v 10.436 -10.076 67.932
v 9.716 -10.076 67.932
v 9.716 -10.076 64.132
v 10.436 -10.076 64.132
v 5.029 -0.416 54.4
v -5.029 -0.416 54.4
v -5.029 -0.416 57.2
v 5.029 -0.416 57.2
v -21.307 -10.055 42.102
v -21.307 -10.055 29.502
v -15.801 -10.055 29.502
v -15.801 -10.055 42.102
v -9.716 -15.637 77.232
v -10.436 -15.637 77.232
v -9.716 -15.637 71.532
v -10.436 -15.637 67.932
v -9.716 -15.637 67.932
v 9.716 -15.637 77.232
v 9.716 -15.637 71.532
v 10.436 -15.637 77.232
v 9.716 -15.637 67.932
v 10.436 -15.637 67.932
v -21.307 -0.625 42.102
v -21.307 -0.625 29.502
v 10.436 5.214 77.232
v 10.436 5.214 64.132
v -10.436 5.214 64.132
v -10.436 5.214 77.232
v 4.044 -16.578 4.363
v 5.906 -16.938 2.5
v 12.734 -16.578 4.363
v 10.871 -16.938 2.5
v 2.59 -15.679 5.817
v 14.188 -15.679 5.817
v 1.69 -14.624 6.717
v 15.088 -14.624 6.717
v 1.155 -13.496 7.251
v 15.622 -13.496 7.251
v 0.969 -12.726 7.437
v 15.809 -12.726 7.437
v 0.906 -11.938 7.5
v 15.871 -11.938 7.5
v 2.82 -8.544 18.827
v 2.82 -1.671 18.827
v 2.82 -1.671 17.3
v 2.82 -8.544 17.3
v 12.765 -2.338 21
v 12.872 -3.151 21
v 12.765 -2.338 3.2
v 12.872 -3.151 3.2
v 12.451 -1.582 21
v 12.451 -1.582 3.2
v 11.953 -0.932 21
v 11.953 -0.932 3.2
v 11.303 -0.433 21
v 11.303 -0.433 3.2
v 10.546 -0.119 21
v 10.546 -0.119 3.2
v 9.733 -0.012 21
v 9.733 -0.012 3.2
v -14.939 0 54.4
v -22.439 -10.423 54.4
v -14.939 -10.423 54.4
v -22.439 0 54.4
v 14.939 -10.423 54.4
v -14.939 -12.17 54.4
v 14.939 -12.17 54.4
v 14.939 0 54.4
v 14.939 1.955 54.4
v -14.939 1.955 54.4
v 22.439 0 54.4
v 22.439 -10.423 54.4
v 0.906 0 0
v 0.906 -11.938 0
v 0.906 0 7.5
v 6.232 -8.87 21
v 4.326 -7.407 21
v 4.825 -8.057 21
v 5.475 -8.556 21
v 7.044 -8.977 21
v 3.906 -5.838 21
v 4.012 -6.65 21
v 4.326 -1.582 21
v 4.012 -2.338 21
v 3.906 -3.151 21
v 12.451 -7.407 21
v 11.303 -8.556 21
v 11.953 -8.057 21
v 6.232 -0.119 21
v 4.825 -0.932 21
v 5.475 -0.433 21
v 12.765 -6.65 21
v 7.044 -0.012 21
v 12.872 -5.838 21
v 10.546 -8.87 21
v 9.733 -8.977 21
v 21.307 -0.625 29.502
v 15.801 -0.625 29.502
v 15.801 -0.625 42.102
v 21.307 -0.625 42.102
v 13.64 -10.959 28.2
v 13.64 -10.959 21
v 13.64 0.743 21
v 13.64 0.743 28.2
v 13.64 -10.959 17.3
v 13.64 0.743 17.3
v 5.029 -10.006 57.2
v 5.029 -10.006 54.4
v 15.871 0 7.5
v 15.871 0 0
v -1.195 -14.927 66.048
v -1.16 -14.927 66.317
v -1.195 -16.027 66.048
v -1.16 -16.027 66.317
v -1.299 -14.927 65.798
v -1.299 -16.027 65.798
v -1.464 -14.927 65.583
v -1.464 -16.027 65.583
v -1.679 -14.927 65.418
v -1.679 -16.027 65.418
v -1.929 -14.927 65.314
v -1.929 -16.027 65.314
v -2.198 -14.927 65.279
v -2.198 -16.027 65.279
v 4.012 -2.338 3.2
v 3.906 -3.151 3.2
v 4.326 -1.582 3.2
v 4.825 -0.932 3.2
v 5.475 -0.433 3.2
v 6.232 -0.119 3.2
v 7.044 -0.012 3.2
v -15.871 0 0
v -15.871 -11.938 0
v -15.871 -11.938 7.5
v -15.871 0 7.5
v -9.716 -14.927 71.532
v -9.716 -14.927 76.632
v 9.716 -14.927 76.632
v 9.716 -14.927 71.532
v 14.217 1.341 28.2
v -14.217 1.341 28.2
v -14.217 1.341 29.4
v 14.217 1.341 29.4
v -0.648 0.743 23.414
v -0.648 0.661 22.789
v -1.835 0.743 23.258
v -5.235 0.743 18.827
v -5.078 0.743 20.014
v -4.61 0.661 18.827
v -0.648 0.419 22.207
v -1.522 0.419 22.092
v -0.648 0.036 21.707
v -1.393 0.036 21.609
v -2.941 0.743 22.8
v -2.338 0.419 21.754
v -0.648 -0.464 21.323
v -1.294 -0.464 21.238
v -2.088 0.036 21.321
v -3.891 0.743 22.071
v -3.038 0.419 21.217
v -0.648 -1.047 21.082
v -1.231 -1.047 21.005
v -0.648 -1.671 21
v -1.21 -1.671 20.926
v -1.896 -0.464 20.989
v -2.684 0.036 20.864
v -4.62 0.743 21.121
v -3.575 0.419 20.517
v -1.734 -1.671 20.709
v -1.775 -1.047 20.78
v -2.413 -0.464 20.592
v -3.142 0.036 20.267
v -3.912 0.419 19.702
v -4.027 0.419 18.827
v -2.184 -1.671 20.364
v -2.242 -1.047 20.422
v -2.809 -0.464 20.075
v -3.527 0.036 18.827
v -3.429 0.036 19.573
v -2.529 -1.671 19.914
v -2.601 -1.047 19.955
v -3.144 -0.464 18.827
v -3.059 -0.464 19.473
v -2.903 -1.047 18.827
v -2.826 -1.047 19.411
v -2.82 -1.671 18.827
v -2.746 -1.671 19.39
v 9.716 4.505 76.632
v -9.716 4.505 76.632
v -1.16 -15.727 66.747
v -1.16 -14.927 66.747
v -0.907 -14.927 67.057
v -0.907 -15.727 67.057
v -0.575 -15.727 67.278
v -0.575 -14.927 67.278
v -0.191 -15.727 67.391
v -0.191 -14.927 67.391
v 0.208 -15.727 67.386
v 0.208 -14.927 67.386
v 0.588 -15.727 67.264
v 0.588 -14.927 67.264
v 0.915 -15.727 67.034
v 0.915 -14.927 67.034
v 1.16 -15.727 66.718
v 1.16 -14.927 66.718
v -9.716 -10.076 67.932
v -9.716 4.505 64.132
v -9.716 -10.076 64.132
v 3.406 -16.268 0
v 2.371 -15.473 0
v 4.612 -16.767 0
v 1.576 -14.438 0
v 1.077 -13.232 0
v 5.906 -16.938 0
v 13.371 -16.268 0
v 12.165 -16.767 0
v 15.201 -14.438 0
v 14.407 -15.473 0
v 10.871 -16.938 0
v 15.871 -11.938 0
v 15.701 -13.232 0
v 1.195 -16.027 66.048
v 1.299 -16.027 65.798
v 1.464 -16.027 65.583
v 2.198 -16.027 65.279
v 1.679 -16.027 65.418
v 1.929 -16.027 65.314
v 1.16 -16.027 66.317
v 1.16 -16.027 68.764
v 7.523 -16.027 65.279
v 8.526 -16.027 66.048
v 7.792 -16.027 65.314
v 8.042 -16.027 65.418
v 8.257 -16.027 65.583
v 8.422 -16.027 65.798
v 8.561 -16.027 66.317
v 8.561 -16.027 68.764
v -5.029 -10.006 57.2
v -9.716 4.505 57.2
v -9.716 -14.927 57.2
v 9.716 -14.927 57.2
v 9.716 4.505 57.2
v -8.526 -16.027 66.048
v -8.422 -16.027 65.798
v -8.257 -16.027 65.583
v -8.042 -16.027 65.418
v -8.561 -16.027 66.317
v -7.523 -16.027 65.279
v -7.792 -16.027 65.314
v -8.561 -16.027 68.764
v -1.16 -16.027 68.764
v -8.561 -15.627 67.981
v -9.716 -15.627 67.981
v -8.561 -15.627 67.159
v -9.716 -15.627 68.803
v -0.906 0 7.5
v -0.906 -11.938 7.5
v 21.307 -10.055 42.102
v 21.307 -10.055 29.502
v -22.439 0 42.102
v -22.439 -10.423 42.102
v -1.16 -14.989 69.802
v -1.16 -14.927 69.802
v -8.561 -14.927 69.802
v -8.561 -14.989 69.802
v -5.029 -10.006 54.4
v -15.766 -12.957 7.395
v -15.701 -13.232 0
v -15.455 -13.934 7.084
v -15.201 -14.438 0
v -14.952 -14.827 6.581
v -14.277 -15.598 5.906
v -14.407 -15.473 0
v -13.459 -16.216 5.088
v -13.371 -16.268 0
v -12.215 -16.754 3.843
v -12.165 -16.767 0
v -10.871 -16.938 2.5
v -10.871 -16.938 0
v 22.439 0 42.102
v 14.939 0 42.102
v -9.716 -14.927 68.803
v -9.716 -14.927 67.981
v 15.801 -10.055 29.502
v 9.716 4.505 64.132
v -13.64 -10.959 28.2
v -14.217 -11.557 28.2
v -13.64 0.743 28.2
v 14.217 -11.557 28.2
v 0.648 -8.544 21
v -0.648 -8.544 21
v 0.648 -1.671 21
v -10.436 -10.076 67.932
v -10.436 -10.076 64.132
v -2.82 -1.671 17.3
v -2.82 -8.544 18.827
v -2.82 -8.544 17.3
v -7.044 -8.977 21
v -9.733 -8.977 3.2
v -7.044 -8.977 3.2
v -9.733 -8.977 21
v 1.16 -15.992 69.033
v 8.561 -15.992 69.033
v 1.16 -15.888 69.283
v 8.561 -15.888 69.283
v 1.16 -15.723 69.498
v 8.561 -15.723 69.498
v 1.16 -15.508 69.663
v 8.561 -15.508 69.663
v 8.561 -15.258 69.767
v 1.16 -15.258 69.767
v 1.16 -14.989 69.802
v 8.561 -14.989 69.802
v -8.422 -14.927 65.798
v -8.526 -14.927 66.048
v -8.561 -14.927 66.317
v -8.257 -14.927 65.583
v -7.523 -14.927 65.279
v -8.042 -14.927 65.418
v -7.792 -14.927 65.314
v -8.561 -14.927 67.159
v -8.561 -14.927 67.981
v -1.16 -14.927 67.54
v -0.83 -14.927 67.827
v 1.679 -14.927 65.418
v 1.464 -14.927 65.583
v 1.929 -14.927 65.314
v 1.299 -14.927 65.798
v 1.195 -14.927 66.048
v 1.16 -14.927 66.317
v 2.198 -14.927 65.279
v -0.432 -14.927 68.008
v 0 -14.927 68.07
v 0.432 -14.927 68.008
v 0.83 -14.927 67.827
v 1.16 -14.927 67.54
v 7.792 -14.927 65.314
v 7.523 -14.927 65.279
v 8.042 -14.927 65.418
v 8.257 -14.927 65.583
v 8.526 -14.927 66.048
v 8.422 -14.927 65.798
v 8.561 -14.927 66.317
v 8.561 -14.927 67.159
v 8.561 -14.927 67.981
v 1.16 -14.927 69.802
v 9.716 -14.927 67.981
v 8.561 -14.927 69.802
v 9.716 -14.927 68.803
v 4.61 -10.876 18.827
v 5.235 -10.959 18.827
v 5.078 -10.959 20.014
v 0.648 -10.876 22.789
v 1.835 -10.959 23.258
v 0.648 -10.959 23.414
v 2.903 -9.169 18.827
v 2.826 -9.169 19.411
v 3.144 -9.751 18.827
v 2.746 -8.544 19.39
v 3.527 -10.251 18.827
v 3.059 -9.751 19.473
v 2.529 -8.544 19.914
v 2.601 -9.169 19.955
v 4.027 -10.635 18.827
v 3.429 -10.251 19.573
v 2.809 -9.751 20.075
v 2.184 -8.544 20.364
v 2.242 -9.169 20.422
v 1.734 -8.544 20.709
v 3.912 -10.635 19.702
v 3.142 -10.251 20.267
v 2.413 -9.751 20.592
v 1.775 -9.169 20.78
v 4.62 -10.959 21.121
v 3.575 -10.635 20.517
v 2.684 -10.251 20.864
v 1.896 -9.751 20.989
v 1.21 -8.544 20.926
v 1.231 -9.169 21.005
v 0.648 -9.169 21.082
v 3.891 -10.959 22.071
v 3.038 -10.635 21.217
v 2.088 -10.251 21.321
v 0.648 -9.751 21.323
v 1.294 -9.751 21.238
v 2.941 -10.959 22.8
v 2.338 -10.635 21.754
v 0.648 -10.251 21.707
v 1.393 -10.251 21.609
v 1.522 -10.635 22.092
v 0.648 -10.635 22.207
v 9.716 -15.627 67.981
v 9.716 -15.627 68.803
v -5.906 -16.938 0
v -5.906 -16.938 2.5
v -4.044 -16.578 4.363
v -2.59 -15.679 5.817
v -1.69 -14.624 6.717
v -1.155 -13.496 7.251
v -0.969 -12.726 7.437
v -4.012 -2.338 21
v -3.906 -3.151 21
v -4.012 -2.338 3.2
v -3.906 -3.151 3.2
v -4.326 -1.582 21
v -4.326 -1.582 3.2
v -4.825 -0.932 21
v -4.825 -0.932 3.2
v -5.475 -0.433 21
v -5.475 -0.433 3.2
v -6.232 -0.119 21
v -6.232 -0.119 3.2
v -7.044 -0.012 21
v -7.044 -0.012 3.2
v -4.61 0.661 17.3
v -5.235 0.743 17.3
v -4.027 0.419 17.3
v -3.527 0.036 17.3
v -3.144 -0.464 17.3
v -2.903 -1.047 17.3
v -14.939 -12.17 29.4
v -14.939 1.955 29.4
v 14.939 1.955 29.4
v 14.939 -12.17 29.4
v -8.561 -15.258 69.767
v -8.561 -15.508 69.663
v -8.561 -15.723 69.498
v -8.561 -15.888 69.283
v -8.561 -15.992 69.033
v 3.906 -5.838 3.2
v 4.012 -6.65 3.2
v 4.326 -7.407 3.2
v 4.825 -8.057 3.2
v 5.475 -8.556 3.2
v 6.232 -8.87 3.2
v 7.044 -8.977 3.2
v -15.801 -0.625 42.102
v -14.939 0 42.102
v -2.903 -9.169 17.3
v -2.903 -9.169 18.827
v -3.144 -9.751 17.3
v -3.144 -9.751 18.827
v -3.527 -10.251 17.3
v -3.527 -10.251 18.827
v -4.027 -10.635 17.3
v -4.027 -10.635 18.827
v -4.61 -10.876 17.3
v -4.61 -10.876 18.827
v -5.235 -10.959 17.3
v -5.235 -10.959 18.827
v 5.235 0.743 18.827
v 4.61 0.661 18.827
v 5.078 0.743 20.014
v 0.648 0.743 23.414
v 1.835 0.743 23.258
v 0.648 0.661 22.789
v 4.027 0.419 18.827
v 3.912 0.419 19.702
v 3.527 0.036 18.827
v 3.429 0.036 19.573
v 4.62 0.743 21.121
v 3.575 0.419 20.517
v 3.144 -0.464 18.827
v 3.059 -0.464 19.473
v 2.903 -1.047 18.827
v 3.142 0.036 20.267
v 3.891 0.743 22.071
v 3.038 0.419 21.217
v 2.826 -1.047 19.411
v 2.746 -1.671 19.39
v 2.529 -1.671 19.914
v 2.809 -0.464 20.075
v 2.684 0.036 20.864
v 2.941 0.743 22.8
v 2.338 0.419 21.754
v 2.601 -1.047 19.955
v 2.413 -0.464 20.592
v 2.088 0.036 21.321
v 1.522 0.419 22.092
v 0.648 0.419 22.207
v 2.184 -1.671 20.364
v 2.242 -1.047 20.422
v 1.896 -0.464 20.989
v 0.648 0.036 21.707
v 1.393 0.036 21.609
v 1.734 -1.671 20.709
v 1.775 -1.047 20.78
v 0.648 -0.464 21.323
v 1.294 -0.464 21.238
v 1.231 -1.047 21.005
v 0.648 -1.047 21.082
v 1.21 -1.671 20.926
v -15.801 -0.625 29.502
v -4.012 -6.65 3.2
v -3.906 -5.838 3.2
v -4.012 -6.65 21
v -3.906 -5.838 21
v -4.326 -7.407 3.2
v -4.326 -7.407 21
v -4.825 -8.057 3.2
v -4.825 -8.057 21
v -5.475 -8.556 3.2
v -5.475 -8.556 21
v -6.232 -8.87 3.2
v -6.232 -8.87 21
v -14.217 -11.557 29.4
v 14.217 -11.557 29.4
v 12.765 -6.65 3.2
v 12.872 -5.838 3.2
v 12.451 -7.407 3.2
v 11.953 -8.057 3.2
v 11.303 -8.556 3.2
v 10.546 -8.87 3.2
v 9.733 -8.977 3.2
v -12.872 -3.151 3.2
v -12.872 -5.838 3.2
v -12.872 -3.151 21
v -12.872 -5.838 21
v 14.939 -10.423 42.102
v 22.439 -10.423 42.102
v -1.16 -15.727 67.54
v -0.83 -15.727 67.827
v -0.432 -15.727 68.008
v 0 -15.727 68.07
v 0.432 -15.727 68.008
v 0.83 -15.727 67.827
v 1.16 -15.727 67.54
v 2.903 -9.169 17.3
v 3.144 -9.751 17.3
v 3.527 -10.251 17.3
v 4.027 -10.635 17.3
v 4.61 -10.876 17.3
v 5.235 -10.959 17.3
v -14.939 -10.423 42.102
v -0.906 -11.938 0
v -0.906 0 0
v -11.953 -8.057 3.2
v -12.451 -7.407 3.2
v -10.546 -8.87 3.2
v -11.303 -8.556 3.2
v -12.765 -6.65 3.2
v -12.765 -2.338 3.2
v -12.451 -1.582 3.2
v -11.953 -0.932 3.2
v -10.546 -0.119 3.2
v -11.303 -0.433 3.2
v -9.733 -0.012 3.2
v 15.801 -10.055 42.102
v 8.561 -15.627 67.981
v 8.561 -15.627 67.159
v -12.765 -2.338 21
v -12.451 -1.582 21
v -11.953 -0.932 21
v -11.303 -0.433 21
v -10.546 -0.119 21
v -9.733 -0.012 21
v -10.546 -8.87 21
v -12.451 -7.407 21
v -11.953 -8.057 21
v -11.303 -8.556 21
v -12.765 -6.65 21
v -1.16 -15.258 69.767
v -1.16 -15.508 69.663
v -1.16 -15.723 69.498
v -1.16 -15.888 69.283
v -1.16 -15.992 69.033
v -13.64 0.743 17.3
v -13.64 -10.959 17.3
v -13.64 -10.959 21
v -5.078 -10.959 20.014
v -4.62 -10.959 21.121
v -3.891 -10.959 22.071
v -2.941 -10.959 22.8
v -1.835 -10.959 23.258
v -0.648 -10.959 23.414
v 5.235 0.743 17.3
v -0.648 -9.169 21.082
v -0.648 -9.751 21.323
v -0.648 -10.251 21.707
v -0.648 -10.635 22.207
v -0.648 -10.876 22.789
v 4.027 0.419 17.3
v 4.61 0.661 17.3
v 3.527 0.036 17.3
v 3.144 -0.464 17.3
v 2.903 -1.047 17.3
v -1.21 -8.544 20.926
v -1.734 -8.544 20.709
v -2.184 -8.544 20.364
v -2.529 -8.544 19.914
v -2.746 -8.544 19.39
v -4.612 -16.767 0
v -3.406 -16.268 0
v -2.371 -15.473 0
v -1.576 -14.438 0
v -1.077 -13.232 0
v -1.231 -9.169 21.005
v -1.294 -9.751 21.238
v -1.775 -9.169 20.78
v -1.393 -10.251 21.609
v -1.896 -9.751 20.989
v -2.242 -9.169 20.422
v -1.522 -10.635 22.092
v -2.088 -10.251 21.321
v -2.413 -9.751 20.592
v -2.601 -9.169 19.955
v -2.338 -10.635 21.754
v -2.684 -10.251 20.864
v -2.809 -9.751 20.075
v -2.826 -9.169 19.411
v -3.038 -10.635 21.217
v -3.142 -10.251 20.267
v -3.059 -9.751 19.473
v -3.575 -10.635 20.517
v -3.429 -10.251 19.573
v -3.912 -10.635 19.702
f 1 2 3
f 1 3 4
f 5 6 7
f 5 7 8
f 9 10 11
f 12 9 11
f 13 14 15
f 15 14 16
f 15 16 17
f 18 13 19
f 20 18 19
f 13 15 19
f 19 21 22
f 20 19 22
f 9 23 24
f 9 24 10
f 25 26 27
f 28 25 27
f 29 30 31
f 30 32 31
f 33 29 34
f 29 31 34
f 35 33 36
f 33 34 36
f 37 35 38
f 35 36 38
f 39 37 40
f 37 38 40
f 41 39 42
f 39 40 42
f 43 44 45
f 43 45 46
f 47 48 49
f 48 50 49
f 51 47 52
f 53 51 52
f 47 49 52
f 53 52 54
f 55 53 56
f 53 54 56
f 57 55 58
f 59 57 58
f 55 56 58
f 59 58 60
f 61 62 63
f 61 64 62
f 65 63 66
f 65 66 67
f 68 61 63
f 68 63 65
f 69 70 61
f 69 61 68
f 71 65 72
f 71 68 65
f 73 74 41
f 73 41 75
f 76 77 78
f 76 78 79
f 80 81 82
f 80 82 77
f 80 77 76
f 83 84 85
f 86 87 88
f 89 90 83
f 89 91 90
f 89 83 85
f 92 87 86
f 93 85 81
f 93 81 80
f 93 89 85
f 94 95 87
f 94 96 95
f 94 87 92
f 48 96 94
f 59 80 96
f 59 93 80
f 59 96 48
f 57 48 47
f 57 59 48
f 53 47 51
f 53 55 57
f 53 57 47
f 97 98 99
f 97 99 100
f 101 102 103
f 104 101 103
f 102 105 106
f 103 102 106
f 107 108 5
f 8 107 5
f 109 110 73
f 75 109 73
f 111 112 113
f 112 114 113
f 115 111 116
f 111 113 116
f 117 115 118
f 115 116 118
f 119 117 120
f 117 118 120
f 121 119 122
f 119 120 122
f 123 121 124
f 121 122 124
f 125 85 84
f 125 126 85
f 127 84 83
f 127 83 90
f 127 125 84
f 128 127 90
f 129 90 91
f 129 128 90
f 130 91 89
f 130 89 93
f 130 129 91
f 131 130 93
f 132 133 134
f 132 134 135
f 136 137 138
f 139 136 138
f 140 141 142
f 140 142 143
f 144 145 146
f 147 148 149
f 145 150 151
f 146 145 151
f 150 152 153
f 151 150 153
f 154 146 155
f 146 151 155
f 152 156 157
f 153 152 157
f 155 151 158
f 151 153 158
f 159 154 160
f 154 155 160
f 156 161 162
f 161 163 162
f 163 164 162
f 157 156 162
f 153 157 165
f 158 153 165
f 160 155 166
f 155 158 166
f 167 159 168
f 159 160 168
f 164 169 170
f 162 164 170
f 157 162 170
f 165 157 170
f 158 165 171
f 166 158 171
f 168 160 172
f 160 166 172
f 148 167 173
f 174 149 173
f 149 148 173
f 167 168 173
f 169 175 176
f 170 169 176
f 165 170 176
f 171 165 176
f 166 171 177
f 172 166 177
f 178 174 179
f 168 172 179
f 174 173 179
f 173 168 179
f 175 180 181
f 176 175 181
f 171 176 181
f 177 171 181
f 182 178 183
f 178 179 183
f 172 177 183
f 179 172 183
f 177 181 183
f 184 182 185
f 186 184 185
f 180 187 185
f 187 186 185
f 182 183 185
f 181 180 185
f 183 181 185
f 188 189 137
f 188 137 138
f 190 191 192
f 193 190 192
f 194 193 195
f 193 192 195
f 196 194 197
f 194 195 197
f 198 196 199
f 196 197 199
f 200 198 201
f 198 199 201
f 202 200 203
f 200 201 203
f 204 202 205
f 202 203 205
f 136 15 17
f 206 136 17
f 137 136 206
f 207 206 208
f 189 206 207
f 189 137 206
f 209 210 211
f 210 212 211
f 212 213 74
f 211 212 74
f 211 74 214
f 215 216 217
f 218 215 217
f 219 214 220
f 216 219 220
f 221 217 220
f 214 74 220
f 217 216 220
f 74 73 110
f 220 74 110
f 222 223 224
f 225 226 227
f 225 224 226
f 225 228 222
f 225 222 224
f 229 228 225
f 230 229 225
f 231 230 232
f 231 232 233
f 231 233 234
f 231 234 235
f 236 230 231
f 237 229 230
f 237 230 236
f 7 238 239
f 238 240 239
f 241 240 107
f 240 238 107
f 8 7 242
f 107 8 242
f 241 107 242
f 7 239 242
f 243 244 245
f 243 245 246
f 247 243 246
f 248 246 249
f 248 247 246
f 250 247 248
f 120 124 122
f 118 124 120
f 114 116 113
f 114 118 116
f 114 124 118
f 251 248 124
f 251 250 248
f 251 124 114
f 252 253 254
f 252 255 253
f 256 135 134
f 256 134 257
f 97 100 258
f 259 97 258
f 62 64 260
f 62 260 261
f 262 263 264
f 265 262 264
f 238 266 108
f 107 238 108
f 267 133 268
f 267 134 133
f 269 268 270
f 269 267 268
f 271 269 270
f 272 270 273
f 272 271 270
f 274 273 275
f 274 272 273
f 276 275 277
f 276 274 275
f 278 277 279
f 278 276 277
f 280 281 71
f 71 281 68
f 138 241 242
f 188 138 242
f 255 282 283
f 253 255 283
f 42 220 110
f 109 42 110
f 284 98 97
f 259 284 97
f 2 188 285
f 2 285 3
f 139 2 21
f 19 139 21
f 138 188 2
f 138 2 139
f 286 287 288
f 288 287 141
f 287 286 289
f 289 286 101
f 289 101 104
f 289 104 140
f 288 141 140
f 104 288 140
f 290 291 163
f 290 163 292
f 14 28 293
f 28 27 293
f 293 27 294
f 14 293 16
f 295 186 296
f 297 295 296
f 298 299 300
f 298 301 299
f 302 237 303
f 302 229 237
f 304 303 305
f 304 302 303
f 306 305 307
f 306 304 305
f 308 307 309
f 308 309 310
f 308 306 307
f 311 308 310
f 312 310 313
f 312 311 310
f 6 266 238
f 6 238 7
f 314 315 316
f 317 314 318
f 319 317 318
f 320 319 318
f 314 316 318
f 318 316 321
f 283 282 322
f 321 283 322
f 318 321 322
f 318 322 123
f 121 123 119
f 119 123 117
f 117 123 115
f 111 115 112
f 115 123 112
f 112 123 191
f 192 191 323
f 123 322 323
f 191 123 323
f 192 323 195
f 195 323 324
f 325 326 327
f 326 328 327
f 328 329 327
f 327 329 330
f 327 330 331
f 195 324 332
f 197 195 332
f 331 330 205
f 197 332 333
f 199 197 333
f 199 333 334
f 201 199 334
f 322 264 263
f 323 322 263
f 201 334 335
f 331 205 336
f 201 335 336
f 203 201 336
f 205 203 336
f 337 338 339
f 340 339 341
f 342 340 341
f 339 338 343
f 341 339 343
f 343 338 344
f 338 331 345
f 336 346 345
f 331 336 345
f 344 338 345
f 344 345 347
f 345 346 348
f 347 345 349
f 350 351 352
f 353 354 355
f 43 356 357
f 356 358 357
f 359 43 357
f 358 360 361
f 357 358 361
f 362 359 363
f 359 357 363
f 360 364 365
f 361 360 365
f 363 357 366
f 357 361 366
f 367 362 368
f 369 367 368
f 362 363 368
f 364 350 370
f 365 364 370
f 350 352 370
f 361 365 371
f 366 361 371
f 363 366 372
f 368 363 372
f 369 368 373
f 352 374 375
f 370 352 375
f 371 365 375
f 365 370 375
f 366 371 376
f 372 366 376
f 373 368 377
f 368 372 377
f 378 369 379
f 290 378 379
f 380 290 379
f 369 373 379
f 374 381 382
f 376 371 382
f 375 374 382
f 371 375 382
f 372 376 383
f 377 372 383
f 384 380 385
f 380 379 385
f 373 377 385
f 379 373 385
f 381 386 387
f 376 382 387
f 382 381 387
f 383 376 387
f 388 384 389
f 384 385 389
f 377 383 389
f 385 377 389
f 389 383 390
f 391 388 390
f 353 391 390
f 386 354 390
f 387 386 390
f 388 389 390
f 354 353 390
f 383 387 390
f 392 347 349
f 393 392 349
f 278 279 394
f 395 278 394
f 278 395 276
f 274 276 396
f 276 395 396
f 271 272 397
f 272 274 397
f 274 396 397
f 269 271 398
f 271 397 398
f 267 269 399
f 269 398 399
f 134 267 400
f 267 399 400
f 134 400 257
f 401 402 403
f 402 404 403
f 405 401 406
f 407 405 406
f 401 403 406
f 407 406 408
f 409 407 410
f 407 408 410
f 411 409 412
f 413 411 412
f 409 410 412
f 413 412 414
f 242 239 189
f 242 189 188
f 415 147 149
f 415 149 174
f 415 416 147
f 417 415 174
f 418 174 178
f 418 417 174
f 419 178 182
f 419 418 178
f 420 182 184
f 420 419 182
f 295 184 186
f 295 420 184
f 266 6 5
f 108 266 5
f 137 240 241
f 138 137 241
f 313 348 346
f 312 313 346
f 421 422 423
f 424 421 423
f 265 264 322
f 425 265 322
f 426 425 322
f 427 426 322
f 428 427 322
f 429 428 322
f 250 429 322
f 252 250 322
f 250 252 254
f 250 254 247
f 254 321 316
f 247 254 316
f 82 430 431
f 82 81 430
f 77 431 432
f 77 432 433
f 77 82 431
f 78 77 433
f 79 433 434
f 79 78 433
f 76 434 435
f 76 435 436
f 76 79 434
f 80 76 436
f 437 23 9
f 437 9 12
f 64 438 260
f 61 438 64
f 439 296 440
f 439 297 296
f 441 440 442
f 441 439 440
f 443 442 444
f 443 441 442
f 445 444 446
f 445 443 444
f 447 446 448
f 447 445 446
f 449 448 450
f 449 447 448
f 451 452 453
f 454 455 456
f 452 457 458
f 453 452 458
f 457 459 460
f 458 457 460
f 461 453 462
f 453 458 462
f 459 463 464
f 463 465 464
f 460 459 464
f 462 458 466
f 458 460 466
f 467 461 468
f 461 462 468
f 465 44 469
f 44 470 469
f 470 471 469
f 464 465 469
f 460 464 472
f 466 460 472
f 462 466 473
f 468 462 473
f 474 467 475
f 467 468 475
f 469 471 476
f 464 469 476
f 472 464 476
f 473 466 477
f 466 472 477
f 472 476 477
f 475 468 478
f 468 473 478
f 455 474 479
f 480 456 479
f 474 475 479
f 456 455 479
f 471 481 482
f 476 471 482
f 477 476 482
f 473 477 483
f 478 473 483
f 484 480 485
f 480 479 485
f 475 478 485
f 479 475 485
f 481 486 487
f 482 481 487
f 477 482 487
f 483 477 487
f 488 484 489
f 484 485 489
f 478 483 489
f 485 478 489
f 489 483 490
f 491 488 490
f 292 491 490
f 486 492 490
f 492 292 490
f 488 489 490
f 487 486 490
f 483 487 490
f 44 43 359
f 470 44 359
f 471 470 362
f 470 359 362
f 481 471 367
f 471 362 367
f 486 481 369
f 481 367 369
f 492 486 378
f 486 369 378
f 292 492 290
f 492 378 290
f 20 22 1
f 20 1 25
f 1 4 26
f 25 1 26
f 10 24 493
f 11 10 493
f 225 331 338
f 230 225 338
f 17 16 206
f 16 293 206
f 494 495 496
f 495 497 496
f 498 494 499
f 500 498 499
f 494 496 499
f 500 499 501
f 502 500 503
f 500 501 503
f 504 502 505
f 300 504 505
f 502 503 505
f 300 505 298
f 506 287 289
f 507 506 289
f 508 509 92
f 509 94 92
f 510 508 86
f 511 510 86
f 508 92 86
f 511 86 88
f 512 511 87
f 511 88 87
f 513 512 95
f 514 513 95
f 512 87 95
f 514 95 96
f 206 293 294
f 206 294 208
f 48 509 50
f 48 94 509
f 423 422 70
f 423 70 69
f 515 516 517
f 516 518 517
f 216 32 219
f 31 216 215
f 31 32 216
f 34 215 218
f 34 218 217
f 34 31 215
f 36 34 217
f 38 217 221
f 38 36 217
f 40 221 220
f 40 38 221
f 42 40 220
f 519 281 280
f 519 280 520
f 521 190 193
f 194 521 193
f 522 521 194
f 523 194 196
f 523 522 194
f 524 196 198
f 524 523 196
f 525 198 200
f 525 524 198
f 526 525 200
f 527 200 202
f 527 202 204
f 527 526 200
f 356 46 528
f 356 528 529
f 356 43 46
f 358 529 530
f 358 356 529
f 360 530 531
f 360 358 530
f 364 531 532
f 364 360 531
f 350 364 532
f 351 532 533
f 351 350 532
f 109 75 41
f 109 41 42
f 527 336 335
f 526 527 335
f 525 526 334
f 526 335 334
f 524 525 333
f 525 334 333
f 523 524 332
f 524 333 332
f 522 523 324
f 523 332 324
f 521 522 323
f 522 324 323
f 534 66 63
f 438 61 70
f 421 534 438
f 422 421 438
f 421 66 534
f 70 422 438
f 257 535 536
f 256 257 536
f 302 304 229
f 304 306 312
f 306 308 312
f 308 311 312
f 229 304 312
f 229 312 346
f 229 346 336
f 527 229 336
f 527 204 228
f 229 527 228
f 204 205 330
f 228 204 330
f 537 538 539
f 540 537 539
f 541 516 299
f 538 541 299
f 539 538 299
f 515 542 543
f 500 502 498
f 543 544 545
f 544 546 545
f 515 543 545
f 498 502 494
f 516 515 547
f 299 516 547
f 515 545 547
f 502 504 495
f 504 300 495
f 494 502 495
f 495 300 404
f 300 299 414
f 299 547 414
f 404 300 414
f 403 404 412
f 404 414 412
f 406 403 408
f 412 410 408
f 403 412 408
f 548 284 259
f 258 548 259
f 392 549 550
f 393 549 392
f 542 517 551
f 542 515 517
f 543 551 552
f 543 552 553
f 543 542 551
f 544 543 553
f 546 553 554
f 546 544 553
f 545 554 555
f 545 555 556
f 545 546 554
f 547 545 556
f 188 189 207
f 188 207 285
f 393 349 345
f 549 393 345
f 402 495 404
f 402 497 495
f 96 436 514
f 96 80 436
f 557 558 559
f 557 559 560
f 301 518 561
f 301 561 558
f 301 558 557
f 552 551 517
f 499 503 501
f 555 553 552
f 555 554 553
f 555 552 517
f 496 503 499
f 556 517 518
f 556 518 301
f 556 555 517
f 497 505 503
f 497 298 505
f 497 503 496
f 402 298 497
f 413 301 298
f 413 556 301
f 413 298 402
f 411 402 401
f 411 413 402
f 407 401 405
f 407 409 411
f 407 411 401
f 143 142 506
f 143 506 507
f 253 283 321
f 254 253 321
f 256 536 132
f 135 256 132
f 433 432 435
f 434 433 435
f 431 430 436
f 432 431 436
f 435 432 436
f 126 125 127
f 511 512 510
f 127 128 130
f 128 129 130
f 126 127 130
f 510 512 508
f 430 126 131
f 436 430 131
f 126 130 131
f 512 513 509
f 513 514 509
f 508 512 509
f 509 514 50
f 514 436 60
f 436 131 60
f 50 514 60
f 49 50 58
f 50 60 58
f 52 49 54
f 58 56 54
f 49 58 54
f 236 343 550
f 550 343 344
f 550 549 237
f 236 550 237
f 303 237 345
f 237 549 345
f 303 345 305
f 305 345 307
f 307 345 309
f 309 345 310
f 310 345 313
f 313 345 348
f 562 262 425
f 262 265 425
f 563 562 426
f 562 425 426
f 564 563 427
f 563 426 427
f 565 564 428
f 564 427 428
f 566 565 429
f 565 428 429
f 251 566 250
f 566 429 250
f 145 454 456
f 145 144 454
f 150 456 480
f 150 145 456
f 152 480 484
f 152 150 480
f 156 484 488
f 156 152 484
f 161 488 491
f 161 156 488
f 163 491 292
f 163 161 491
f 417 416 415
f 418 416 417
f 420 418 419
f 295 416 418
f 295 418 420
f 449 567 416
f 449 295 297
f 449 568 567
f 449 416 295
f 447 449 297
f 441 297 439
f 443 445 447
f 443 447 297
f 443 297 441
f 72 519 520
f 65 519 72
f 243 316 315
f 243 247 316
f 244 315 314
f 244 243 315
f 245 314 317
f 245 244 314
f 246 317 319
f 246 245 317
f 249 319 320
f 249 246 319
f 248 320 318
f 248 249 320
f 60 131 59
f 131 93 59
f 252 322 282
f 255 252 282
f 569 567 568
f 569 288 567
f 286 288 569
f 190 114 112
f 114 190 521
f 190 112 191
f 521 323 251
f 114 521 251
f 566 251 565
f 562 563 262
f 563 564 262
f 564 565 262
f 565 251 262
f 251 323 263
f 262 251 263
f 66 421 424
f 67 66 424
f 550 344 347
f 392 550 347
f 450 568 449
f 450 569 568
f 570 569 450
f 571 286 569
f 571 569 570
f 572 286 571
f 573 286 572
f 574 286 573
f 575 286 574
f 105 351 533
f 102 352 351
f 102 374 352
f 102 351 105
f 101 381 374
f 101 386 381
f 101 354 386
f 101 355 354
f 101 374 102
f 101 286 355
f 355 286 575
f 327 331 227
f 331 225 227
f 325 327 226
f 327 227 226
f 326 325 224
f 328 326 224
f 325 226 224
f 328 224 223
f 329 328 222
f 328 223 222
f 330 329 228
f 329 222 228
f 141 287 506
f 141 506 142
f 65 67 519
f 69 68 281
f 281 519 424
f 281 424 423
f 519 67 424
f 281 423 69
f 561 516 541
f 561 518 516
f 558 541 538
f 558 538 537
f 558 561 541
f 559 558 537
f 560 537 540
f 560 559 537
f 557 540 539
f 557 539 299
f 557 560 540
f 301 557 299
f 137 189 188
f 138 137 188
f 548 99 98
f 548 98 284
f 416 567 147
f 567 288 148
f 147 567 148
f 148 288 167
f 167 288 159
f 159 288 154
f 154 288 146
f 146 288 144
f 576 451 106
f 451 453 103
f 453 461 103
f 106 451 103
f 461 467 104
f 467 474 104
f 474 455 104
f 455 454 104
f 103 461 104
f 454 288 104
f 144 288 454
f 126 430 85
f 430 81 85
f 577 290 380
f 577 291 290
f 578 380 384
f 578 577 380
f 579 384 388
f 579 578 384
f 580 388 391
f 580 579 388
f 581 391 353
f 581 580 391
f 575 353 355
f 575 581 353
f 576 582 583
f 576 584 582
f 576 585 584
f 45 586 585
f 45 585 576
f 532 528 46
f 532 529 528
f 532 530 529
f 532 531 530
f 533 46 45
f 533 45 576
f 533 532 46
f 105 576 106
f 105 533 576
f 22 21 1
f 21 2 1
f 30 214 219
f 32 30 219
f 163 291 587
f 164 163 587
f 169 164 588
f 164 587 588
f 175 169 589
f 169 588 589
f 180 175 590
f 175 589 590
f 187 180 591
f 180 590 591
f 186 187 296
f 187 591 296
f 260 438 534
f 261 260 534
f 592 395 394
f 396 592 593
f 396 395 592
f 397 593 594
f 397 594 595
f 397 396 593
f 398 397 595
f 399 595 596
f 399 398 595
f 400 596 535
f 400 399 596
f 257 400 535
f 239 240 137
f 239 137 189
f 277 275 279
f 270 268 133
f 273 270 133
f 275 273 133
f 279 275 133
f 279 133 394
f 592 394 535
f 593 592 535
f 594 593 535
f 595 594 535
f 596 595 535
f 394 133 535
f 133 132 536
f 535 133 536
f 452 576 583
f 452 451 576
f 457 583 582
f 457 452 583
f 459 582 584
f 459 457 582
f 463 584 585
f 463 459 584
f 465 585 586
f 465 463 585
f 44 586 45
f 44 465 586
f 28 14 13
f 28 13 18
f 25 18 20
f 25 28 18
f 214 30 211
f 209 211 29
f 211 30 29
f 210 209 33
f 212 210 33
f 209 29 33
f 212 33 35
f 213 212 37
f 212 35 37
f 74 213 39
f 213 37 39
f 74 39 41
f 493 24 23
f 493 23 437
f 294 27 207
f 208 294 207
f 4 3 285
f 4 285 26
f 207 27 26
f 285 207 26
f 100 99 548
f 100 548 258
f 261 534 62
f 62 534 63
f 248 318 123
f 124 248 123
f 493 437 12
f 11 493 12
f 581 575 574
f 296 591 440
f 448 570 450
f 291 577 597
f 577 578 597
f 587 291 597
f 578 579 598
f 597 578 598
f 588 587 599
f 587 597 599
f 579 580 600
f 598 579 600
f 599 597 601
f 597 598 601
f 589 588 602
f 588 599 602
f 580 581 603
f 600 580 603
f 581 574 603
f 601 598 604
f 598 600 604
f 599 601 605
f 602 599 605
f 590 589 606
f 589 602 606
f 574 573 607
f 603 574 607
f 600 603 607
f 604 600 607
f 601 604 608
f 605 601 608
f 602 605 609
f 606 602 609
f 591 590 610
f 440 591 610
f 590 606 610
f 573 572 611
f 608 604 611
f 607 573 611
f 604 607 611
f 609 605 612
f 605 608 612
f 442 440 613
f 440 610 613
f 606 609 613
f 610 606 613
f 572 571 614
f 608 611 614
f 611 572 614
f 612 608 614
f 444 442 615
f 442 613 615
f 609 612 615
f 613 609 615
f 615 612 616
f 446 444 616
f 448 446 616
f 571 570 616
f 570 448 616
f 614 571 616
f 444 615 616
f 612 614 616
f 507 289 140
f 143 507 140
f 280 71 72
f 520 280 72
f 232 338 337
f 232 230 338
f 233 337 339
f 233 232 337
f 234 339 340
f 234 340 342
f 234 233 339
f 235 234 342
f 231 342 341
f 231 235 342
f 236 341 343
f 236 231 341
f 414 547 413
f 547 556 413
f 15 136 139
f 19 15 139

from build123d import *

# Parameters (mm, degrees)
F0_W           = 14.9648044608
F0_H           = 16.937578097
F0_W_2         = 1.812669565
F0_W_3         = 14.9648083382
F1_DEPTH       = 7.5
F2_DEPTH       = 14.2
F3_R           = 5
F4_W           = 8.966412507
F4_H           = 8.9642944624
F5_DEPTH       = 13.5
F5_DEPTH_BACK  = 4.3
F6_R           = 3.1384776311
F6_2_R         = 3.1384776311
F7_W           = 27.2792670876
F7_H           = 11.7013510317
F8_DEPTH       = 7.2
F9_W           = 10.8192516491
F9_H           = 11.7013510317
F10_DEPTH      = 3.7
F10_DEPTH_BACK = 2.3
F11_R          = 2.1727922061
F12_R          = 2.4142135624
F13_W          = 28.4332055598
F13_H          = 12.8980111331
F14_DEPTH      = 1.2
F15_W          = 29.8774708062
F15_H          = 14.1250584275
F15_W_2        = 28.4332055598
F15_H_2        = 12.8980111331
F16_DEPTH      = 25
F17_W          = 10.4226022959
F17_H          = 12.2977413476
F18_DEPTH      = 7.5
F18_DEPTH_BACK = 37.37747
F19_W          = 5.5065192282
F19_H          = 9.4299116172
F20_DEPTH      = 12.6
F21_W          = 10.0570814684
F21_H          = 9.5903184265
F22_DEPTH      = 2.8
F23_W          = 19.431643188
F23_H          = 19.43164
F23_W_2        = 10.0570814684
F23_H_2        = 9.5903184265
F24_DEPTH      = 19.43164
F26_DEPTH      = 12.5
F27_DEPTH      = 8.7
F25_W          = 19.431643188
F25_H          = 0.7098612483
F28_DEPTH      = 5.1
F29_DEPTH      = 0.6
F31_DEPTH      = 0.8
F32_DEPTH      = 1.1
F33_DEPTH      = 0.7
F34_R          = 1.0381118318


with BuildPart() as f1:
    # F0 (on Top) → F1 (new body)
    with BuildSketch(Plane.XY):
        with Locations((-8.3887370129, -8.4687890485)):
            Rectangle(F0_W, F0_H)
        with Locations((0, -8.4687890485)):
            Rectangle(F0_W_2, F0_H)
        with Locations((8.3887389516, -8.4687890485)):
            Rectangle(F0_W_3, F0_H)
    extrude(amount=F1_DEPTH)

    # F0 (on Top) → F2 (cut)
    with BuildSketch(Plane.XY):
        with Locations((0, -8.4687890485)):
            Rectangle(F0_W_2, F0_H)
    extrude(amount=F2_DEPTH, mode=Mode.SUBTRACT)

    # F3
    f3_edges = [f1.edges().sort_by_distance(p)[0] for p in [
        (-15.871139, -16.937578, 3.75),
        (-0.906335, -16.937578, 3.75),
        (0.906335, -16.937578, 3.75),
        (15.871143, -16.937578, 3.75),
        (-8.388737, -16.937578, 7.5),
        (8.388739, -16.937578, 7.5),
    ]]
    fillet(f3_edges, radius=F3_R)


with BuildPart() as f5:
    # F4 (on face) → F5 (new body, two sides)
    with BuildSketch(Plane.XY.offset(7.5)) as f5_sk:
        with Locations((-8.3887370129, -4.4944216307)):
            Rectangle(F4_W, F4_H)
    extrude(amount=F5_DEPTH)
    extrude(f5_sk.sketch, amount=-F5_DEPTH_BACK)

    # F6
    f6_edges = [f5.edges().sort_by_distance(p)[0] for p in [
        (-12.871943, -8.976569, 12.1),
        (-3.905531, -8.976569, 12.1),
        (-12.871943, -0.012274, 12.1),
        (-3.905531, -0.012274, 12.1),
    ]]
    fillet(f6_edges, radius=F6_R)


with BuildPart() as f5b:
    # F4 (on face) → F5, piece 2 (new body, two sides)
    with BuildSketch(Plane.XY.offset(7.5)) as f5_2_sk:
        with Locations((8.3887370129, -4.4944216307)):
            Rectangle(F4_W, F4_H)
    extrude(amount=F5_DEPTH)
    extrude(f5_2_sk.sketch, amount=-F5_DEPTH_BACK)

    # F6#2
    f6_2_edges = [f5b.edges().sort_by_distance(p)[0] for p in [
        (3.905531, -8.976569, 12.1),
        (12.871943, -8.976569, 12.1),
        (12.871943, -0.012274, 12.1),
        (3.905531, -0.012274, 12.1),
    ]]
    fillet(f6_2_edges, radius=F6_2_R)


with BuildPart() as f8:
    # F7 (on face) → F8 (new body)
    with BuildSketch(Plane.XY.offset(21)):
        with Locations((0, -5.1078274846)):
            Rectangle(F7_W, F7_H)
    extrude(amount=F8_DEPTH)

    # F9 (on face) → F10 (join, two sides)
    with BuildSketch(Plane(origin=(0, 0, 21), x_dir=(1, 0, 0), z_dir=(0, 0, -1))) as f10_sk:
        with Locations((-8.2300077192, 5.1078274846)):
            Rectangle(F9_W, F9_H)
        with Locations((8.2300077192, 5.1078274846)):
            Rectangle(F9_W, F9_H)
    extrude(amount=F10_DEPTH)
    extrude(f10_sk.sketch, amount=-F10_DEPTH_BACK)

    # F11
    f11_edges = [f8.edges().sort_by_distance(p)[0] for p in [
        (2.820382, -5.107827, 21),
        (-2.820382, -5.107827, 21),
    ]]
    fillet(f11_edges, radius=F11_R)

    # F12
    f12_edges = [f8.edges().sort_by_distance(p)[0] for p in [
        (2.183986, 0.742848, 20.363604),
        (-2.183986, -10.958503, 20.363604),
        (2.820382, -10.958503, 18.063604),
        (2.183986, -10.958503, 20.363604),
        (0, -10.958503, 21),
        (-2.820382, -10.958503, 18.063604),
        (2.820382, 0.742848, 18.063604),
        (0, 0.742848, 21),
        (-2.183986, 0.742848, 20.363604),
        (-2.820382, 0.742848, 18.063604),
    ]]
    fillet(f12_edges, radius=F12_R)

    # F13 (on face) → F14 (join)
    with BuildSketch(Plane.XY.offset(28.2)):
        with Locations((0, -5.1078274846)):
            Rectangle(F13_W, F13_H)
    extrude(amount=F14_DEPTH)


with BuildPart() as f16:
    # F15 (on face) → F16 (new body)
    with BuildSketch(Plane.XY.offset(29.4)):
        with Locations((0, -5.1078274846)):
            Rectangle(F15_W, F15_H)
        with Locations((0, -5.1078274846)):
            Rectangle(F15_W_2, F15_H_2, mode=Mode.SUBTRACT)
        with Locations((0, -5.1078274846)):
            Rectangle(F15_W_2, F15_H_2)
    extrude(amount=F16_DEPTH)

    # F17 (on face) → F18 (join, two sides)
    with BuildSketch(Plane(origin=(-14.9387354031, 0, 0), x_dir=(0, -1, 0), z_dir=(-1, 0, 0))) as f18_sk:
        with Locations((5.2113011479, 48.2511293262)):
            Rectangle(F17_W, F17_H)
    extrude(amount=F18_DEPTH)
    extrude(f18_sk.sketch, amount=-F18_DEPTH_BACK)


with BuildPart() as f20:
    # F19 (on face) → F20 (new body)
    with BuildSketch(Plane(origin=(0, 0, 42.1022586524), x_dir=(1, 0, 0), z_dir=(0, 0, -1))):
        with Locations((-18.5539349914, 5.3402557969)):
            Rectangle(F19_W, F19_H)
    extrude(amount=F20_DEPTH)


with BuildPart() as f20b:
    # F19 (on face) → F20, piece 2 (new body)
    with BuildSketch(Plane(origin=(0, 0, 42.1022586524), x_dir=(1, 0, 0), z_dir=(0, 0, -1))):
        with Locations((18.5539349914, 5.3402557969)):
            Rectangle(F19_W, F19_H)
    extrude(amount=F20_DEPTH)


with BuildPart() as f22:
    # F21 (on face) → F22 (new body)
    with BuildSketch(Plane.XY.offset(54.4)):
        with Locations((0, -5.2113011479)):
            Rectangle(F21_W, F21_H)
    extrude(amount=F22_DEPTH)

    # F23 (on face) → F24 (join)
    with BuildSketch(Plane.XY.offset(57.2)):
        with Locations((0, -5.2113011479)):
            Rectangle(F23_W, F23_H)
        with Locations((0, -5.2113011479)):
            Rectangle(F23_W_2, F23_H_2, mode=Mode.SUBTRACT)
        with Locations((0, -5.2113011479)):
            Rectangle(F23_W_2, F23_H_2)
    extrude(amount=F24_DEPTH)


with BuildPart() as f26:
    # F25 (on face) → F26 (new body)
    with BuildSketch(Plane.XY.offset(76.63164)):
        Polygon((9.715821594, -10.076250881), (10.4362731799, -10.076250881), (10.4362731799, 5.2143801004), (-10.4362731799, 5.2143801004), (-10.4362731799, -10.076250881), (-9.715821594, -10.076250881), (-9.715821594, 4.5045188521), (9.715821594, 4.5045188521), align=None)
    extrude(amount=-F26_DEPTH)

    # F25 (on face) → F27 (join)
    with BuildSketch(Plane.XY.offset(76.63164)):
        Polygon((-10.4362731799, -15.6369823962), (-9.715821594, -15.6369823962), (-9.715821594, -14.9271211479), (-9.715821594, -10.076250881), (-10.4362731799, -10.076250881), align=None)
        Polygon((9.715821594, -15.6369823962), (10.4362731799, -15.6369823962), (10.4362731799, -10.076250881), (9.715821594, -10.076250881), (9.715821594, -14.9271211479), align=None)
    extrude(amount=-F27_DEPTH)

    # F25 (on face) → F28 (join)
    with BuildSketch(Plane.XY.offset(76.63164)):
        with Locations((0, -15.2820517721)):
            Rectangle(F25_W, F25_H)
    extrude(amount=-F28_DEPTH)

    # F25 (on face) → F29 (join)
    with BuildSketch(Plane.XY.offset(76.63164)):
        Polygon((9.715821594, -10.076250881), (10.4362731799, -10.076250881), (10.4362731799, 5.2143801004), (-10.4362731799, 5.2143801004), (-10.4362731799, -10.076250881), (-9.715821594, -10.076250881), (-9.715821594, 4.5045188521), (9.715821594, 4.5045188521), align=None)
        Polygon((-10.4362731799, -15.6369823962), (-9.715821594, -15.6369823962), (-9.715821594, -14.9271211479), (-9.715821594, -10.076250881), (-10.4362731799, -10.076250881), align=None)
        with Locations((0, -15.2820517721)):
            Rectangle(F25_W, F25_H)
        Polygon((-9.715821594, -14.9271211479), (9.715821594, -14.9271211479), (9.715821594, -10.076250881), (9.715821594, 4.5045188521), (-9.715821594, 4.5045188521), (-9.715821594, -10.076250881), align=None)
        Polygon((9.715821594, -15.6369823962), (10.4362731799, -15.6369823962), (10.4362731799, -10.076250881), (9.715821594, -10.076250881), (9.715821594, -14.9271211479), align=None)
    extrude(amount=F29_DEPTH)


with BuildPart() as f31:
    # F30 (on face) → F31 (new body)
    with BuildSketch(Plane.XZ.offset(14.9271211479)):
        with BuildLine():
            Line((-1.1596926488, 67.5404071808), (-1.1596926488, 66.7473971844))
            ThreePointArc((-1.1596926488, 66.7473971844), (0.0084986196, 67.4038543011), (1.1596926488, 66.7180269957))
            Line((1.1596926488, 66.7180269957), (1.1596926488, 67.5404071808))
            ThreePointArc((1.1596926488, 67.5404071808), (0, 68.070335216), (-1.1596926488, 67.5404071808))
        make_face()
    extrude(amount=F31_DEPTH)

    # F30 (on face) → F32 (join)
    with BuildSketch(Plane.XZ.offset(14.9271211479)):
        Polygon((1.1596926488, 67.5404071808), (1.1596926488, 66.7180269957), (1.1596926488, 65.278865397), (8.561090799, 65.278865397), (8.561090799, 67.1585947275), (8.561090799, 67.9809674621), (8.561090799, 69.8019489646), (1.1596926488, 69.8019489646), align=None)
        Polygon((-8.561090799, 65.278865397), (-1.1596926488, 65.278865397), (-1.1596926488, 66.7473971844), (-1.1596926488, 67.5404071808), (-1.1596926488, 69.8019489646), (-8.561090799, 69.8019489646), (-8.561090799, 67.9809674621), (-8.561090799, 67.1585947275), align=None)
    extrude(amount=F32_DEPTH)

    # F30 (on face) → F33 (join)
    with BuildSketch(Plane.XZ.offset(14.9271211479)):
        Polygon((-9.715821594, 67.9809674621), (-8.561090799, 67.1585947275), (-8.561090799, 67.9809674621), (-9.715821594, 68.8033401966), align=None)
        Polygon((8.561090799, 67.9809674621), (8.561090799, 67.1585947275), (9.715821594, 67.9809674621), (9.715821594, 68.8033401966), align=None)
    extrude(amount=F33_DEPTH)

    # F34
    f34_edges = [f31.edges().sort_by_distance(p)[0] for p in [
        (-1.159693, -15.477121, 65.278865),
        (-8.561091, -15.477121, 65.278865),
        (1.159693, -15.477121, 65.278865),
        (8.561091, -15.477121, 65.278865),
        (-4.860392, -16.027121, 69.801949),
        (4.860392, -16.027121, 69.801949),
    ]]
    fillet(f34_edges, radius=F34_R)


solid = Compound([f1.part, f5.part, f5b.part, f8.part, f16.part, f20.part, f20b.part, f22.part, f26.part, f31.part])
